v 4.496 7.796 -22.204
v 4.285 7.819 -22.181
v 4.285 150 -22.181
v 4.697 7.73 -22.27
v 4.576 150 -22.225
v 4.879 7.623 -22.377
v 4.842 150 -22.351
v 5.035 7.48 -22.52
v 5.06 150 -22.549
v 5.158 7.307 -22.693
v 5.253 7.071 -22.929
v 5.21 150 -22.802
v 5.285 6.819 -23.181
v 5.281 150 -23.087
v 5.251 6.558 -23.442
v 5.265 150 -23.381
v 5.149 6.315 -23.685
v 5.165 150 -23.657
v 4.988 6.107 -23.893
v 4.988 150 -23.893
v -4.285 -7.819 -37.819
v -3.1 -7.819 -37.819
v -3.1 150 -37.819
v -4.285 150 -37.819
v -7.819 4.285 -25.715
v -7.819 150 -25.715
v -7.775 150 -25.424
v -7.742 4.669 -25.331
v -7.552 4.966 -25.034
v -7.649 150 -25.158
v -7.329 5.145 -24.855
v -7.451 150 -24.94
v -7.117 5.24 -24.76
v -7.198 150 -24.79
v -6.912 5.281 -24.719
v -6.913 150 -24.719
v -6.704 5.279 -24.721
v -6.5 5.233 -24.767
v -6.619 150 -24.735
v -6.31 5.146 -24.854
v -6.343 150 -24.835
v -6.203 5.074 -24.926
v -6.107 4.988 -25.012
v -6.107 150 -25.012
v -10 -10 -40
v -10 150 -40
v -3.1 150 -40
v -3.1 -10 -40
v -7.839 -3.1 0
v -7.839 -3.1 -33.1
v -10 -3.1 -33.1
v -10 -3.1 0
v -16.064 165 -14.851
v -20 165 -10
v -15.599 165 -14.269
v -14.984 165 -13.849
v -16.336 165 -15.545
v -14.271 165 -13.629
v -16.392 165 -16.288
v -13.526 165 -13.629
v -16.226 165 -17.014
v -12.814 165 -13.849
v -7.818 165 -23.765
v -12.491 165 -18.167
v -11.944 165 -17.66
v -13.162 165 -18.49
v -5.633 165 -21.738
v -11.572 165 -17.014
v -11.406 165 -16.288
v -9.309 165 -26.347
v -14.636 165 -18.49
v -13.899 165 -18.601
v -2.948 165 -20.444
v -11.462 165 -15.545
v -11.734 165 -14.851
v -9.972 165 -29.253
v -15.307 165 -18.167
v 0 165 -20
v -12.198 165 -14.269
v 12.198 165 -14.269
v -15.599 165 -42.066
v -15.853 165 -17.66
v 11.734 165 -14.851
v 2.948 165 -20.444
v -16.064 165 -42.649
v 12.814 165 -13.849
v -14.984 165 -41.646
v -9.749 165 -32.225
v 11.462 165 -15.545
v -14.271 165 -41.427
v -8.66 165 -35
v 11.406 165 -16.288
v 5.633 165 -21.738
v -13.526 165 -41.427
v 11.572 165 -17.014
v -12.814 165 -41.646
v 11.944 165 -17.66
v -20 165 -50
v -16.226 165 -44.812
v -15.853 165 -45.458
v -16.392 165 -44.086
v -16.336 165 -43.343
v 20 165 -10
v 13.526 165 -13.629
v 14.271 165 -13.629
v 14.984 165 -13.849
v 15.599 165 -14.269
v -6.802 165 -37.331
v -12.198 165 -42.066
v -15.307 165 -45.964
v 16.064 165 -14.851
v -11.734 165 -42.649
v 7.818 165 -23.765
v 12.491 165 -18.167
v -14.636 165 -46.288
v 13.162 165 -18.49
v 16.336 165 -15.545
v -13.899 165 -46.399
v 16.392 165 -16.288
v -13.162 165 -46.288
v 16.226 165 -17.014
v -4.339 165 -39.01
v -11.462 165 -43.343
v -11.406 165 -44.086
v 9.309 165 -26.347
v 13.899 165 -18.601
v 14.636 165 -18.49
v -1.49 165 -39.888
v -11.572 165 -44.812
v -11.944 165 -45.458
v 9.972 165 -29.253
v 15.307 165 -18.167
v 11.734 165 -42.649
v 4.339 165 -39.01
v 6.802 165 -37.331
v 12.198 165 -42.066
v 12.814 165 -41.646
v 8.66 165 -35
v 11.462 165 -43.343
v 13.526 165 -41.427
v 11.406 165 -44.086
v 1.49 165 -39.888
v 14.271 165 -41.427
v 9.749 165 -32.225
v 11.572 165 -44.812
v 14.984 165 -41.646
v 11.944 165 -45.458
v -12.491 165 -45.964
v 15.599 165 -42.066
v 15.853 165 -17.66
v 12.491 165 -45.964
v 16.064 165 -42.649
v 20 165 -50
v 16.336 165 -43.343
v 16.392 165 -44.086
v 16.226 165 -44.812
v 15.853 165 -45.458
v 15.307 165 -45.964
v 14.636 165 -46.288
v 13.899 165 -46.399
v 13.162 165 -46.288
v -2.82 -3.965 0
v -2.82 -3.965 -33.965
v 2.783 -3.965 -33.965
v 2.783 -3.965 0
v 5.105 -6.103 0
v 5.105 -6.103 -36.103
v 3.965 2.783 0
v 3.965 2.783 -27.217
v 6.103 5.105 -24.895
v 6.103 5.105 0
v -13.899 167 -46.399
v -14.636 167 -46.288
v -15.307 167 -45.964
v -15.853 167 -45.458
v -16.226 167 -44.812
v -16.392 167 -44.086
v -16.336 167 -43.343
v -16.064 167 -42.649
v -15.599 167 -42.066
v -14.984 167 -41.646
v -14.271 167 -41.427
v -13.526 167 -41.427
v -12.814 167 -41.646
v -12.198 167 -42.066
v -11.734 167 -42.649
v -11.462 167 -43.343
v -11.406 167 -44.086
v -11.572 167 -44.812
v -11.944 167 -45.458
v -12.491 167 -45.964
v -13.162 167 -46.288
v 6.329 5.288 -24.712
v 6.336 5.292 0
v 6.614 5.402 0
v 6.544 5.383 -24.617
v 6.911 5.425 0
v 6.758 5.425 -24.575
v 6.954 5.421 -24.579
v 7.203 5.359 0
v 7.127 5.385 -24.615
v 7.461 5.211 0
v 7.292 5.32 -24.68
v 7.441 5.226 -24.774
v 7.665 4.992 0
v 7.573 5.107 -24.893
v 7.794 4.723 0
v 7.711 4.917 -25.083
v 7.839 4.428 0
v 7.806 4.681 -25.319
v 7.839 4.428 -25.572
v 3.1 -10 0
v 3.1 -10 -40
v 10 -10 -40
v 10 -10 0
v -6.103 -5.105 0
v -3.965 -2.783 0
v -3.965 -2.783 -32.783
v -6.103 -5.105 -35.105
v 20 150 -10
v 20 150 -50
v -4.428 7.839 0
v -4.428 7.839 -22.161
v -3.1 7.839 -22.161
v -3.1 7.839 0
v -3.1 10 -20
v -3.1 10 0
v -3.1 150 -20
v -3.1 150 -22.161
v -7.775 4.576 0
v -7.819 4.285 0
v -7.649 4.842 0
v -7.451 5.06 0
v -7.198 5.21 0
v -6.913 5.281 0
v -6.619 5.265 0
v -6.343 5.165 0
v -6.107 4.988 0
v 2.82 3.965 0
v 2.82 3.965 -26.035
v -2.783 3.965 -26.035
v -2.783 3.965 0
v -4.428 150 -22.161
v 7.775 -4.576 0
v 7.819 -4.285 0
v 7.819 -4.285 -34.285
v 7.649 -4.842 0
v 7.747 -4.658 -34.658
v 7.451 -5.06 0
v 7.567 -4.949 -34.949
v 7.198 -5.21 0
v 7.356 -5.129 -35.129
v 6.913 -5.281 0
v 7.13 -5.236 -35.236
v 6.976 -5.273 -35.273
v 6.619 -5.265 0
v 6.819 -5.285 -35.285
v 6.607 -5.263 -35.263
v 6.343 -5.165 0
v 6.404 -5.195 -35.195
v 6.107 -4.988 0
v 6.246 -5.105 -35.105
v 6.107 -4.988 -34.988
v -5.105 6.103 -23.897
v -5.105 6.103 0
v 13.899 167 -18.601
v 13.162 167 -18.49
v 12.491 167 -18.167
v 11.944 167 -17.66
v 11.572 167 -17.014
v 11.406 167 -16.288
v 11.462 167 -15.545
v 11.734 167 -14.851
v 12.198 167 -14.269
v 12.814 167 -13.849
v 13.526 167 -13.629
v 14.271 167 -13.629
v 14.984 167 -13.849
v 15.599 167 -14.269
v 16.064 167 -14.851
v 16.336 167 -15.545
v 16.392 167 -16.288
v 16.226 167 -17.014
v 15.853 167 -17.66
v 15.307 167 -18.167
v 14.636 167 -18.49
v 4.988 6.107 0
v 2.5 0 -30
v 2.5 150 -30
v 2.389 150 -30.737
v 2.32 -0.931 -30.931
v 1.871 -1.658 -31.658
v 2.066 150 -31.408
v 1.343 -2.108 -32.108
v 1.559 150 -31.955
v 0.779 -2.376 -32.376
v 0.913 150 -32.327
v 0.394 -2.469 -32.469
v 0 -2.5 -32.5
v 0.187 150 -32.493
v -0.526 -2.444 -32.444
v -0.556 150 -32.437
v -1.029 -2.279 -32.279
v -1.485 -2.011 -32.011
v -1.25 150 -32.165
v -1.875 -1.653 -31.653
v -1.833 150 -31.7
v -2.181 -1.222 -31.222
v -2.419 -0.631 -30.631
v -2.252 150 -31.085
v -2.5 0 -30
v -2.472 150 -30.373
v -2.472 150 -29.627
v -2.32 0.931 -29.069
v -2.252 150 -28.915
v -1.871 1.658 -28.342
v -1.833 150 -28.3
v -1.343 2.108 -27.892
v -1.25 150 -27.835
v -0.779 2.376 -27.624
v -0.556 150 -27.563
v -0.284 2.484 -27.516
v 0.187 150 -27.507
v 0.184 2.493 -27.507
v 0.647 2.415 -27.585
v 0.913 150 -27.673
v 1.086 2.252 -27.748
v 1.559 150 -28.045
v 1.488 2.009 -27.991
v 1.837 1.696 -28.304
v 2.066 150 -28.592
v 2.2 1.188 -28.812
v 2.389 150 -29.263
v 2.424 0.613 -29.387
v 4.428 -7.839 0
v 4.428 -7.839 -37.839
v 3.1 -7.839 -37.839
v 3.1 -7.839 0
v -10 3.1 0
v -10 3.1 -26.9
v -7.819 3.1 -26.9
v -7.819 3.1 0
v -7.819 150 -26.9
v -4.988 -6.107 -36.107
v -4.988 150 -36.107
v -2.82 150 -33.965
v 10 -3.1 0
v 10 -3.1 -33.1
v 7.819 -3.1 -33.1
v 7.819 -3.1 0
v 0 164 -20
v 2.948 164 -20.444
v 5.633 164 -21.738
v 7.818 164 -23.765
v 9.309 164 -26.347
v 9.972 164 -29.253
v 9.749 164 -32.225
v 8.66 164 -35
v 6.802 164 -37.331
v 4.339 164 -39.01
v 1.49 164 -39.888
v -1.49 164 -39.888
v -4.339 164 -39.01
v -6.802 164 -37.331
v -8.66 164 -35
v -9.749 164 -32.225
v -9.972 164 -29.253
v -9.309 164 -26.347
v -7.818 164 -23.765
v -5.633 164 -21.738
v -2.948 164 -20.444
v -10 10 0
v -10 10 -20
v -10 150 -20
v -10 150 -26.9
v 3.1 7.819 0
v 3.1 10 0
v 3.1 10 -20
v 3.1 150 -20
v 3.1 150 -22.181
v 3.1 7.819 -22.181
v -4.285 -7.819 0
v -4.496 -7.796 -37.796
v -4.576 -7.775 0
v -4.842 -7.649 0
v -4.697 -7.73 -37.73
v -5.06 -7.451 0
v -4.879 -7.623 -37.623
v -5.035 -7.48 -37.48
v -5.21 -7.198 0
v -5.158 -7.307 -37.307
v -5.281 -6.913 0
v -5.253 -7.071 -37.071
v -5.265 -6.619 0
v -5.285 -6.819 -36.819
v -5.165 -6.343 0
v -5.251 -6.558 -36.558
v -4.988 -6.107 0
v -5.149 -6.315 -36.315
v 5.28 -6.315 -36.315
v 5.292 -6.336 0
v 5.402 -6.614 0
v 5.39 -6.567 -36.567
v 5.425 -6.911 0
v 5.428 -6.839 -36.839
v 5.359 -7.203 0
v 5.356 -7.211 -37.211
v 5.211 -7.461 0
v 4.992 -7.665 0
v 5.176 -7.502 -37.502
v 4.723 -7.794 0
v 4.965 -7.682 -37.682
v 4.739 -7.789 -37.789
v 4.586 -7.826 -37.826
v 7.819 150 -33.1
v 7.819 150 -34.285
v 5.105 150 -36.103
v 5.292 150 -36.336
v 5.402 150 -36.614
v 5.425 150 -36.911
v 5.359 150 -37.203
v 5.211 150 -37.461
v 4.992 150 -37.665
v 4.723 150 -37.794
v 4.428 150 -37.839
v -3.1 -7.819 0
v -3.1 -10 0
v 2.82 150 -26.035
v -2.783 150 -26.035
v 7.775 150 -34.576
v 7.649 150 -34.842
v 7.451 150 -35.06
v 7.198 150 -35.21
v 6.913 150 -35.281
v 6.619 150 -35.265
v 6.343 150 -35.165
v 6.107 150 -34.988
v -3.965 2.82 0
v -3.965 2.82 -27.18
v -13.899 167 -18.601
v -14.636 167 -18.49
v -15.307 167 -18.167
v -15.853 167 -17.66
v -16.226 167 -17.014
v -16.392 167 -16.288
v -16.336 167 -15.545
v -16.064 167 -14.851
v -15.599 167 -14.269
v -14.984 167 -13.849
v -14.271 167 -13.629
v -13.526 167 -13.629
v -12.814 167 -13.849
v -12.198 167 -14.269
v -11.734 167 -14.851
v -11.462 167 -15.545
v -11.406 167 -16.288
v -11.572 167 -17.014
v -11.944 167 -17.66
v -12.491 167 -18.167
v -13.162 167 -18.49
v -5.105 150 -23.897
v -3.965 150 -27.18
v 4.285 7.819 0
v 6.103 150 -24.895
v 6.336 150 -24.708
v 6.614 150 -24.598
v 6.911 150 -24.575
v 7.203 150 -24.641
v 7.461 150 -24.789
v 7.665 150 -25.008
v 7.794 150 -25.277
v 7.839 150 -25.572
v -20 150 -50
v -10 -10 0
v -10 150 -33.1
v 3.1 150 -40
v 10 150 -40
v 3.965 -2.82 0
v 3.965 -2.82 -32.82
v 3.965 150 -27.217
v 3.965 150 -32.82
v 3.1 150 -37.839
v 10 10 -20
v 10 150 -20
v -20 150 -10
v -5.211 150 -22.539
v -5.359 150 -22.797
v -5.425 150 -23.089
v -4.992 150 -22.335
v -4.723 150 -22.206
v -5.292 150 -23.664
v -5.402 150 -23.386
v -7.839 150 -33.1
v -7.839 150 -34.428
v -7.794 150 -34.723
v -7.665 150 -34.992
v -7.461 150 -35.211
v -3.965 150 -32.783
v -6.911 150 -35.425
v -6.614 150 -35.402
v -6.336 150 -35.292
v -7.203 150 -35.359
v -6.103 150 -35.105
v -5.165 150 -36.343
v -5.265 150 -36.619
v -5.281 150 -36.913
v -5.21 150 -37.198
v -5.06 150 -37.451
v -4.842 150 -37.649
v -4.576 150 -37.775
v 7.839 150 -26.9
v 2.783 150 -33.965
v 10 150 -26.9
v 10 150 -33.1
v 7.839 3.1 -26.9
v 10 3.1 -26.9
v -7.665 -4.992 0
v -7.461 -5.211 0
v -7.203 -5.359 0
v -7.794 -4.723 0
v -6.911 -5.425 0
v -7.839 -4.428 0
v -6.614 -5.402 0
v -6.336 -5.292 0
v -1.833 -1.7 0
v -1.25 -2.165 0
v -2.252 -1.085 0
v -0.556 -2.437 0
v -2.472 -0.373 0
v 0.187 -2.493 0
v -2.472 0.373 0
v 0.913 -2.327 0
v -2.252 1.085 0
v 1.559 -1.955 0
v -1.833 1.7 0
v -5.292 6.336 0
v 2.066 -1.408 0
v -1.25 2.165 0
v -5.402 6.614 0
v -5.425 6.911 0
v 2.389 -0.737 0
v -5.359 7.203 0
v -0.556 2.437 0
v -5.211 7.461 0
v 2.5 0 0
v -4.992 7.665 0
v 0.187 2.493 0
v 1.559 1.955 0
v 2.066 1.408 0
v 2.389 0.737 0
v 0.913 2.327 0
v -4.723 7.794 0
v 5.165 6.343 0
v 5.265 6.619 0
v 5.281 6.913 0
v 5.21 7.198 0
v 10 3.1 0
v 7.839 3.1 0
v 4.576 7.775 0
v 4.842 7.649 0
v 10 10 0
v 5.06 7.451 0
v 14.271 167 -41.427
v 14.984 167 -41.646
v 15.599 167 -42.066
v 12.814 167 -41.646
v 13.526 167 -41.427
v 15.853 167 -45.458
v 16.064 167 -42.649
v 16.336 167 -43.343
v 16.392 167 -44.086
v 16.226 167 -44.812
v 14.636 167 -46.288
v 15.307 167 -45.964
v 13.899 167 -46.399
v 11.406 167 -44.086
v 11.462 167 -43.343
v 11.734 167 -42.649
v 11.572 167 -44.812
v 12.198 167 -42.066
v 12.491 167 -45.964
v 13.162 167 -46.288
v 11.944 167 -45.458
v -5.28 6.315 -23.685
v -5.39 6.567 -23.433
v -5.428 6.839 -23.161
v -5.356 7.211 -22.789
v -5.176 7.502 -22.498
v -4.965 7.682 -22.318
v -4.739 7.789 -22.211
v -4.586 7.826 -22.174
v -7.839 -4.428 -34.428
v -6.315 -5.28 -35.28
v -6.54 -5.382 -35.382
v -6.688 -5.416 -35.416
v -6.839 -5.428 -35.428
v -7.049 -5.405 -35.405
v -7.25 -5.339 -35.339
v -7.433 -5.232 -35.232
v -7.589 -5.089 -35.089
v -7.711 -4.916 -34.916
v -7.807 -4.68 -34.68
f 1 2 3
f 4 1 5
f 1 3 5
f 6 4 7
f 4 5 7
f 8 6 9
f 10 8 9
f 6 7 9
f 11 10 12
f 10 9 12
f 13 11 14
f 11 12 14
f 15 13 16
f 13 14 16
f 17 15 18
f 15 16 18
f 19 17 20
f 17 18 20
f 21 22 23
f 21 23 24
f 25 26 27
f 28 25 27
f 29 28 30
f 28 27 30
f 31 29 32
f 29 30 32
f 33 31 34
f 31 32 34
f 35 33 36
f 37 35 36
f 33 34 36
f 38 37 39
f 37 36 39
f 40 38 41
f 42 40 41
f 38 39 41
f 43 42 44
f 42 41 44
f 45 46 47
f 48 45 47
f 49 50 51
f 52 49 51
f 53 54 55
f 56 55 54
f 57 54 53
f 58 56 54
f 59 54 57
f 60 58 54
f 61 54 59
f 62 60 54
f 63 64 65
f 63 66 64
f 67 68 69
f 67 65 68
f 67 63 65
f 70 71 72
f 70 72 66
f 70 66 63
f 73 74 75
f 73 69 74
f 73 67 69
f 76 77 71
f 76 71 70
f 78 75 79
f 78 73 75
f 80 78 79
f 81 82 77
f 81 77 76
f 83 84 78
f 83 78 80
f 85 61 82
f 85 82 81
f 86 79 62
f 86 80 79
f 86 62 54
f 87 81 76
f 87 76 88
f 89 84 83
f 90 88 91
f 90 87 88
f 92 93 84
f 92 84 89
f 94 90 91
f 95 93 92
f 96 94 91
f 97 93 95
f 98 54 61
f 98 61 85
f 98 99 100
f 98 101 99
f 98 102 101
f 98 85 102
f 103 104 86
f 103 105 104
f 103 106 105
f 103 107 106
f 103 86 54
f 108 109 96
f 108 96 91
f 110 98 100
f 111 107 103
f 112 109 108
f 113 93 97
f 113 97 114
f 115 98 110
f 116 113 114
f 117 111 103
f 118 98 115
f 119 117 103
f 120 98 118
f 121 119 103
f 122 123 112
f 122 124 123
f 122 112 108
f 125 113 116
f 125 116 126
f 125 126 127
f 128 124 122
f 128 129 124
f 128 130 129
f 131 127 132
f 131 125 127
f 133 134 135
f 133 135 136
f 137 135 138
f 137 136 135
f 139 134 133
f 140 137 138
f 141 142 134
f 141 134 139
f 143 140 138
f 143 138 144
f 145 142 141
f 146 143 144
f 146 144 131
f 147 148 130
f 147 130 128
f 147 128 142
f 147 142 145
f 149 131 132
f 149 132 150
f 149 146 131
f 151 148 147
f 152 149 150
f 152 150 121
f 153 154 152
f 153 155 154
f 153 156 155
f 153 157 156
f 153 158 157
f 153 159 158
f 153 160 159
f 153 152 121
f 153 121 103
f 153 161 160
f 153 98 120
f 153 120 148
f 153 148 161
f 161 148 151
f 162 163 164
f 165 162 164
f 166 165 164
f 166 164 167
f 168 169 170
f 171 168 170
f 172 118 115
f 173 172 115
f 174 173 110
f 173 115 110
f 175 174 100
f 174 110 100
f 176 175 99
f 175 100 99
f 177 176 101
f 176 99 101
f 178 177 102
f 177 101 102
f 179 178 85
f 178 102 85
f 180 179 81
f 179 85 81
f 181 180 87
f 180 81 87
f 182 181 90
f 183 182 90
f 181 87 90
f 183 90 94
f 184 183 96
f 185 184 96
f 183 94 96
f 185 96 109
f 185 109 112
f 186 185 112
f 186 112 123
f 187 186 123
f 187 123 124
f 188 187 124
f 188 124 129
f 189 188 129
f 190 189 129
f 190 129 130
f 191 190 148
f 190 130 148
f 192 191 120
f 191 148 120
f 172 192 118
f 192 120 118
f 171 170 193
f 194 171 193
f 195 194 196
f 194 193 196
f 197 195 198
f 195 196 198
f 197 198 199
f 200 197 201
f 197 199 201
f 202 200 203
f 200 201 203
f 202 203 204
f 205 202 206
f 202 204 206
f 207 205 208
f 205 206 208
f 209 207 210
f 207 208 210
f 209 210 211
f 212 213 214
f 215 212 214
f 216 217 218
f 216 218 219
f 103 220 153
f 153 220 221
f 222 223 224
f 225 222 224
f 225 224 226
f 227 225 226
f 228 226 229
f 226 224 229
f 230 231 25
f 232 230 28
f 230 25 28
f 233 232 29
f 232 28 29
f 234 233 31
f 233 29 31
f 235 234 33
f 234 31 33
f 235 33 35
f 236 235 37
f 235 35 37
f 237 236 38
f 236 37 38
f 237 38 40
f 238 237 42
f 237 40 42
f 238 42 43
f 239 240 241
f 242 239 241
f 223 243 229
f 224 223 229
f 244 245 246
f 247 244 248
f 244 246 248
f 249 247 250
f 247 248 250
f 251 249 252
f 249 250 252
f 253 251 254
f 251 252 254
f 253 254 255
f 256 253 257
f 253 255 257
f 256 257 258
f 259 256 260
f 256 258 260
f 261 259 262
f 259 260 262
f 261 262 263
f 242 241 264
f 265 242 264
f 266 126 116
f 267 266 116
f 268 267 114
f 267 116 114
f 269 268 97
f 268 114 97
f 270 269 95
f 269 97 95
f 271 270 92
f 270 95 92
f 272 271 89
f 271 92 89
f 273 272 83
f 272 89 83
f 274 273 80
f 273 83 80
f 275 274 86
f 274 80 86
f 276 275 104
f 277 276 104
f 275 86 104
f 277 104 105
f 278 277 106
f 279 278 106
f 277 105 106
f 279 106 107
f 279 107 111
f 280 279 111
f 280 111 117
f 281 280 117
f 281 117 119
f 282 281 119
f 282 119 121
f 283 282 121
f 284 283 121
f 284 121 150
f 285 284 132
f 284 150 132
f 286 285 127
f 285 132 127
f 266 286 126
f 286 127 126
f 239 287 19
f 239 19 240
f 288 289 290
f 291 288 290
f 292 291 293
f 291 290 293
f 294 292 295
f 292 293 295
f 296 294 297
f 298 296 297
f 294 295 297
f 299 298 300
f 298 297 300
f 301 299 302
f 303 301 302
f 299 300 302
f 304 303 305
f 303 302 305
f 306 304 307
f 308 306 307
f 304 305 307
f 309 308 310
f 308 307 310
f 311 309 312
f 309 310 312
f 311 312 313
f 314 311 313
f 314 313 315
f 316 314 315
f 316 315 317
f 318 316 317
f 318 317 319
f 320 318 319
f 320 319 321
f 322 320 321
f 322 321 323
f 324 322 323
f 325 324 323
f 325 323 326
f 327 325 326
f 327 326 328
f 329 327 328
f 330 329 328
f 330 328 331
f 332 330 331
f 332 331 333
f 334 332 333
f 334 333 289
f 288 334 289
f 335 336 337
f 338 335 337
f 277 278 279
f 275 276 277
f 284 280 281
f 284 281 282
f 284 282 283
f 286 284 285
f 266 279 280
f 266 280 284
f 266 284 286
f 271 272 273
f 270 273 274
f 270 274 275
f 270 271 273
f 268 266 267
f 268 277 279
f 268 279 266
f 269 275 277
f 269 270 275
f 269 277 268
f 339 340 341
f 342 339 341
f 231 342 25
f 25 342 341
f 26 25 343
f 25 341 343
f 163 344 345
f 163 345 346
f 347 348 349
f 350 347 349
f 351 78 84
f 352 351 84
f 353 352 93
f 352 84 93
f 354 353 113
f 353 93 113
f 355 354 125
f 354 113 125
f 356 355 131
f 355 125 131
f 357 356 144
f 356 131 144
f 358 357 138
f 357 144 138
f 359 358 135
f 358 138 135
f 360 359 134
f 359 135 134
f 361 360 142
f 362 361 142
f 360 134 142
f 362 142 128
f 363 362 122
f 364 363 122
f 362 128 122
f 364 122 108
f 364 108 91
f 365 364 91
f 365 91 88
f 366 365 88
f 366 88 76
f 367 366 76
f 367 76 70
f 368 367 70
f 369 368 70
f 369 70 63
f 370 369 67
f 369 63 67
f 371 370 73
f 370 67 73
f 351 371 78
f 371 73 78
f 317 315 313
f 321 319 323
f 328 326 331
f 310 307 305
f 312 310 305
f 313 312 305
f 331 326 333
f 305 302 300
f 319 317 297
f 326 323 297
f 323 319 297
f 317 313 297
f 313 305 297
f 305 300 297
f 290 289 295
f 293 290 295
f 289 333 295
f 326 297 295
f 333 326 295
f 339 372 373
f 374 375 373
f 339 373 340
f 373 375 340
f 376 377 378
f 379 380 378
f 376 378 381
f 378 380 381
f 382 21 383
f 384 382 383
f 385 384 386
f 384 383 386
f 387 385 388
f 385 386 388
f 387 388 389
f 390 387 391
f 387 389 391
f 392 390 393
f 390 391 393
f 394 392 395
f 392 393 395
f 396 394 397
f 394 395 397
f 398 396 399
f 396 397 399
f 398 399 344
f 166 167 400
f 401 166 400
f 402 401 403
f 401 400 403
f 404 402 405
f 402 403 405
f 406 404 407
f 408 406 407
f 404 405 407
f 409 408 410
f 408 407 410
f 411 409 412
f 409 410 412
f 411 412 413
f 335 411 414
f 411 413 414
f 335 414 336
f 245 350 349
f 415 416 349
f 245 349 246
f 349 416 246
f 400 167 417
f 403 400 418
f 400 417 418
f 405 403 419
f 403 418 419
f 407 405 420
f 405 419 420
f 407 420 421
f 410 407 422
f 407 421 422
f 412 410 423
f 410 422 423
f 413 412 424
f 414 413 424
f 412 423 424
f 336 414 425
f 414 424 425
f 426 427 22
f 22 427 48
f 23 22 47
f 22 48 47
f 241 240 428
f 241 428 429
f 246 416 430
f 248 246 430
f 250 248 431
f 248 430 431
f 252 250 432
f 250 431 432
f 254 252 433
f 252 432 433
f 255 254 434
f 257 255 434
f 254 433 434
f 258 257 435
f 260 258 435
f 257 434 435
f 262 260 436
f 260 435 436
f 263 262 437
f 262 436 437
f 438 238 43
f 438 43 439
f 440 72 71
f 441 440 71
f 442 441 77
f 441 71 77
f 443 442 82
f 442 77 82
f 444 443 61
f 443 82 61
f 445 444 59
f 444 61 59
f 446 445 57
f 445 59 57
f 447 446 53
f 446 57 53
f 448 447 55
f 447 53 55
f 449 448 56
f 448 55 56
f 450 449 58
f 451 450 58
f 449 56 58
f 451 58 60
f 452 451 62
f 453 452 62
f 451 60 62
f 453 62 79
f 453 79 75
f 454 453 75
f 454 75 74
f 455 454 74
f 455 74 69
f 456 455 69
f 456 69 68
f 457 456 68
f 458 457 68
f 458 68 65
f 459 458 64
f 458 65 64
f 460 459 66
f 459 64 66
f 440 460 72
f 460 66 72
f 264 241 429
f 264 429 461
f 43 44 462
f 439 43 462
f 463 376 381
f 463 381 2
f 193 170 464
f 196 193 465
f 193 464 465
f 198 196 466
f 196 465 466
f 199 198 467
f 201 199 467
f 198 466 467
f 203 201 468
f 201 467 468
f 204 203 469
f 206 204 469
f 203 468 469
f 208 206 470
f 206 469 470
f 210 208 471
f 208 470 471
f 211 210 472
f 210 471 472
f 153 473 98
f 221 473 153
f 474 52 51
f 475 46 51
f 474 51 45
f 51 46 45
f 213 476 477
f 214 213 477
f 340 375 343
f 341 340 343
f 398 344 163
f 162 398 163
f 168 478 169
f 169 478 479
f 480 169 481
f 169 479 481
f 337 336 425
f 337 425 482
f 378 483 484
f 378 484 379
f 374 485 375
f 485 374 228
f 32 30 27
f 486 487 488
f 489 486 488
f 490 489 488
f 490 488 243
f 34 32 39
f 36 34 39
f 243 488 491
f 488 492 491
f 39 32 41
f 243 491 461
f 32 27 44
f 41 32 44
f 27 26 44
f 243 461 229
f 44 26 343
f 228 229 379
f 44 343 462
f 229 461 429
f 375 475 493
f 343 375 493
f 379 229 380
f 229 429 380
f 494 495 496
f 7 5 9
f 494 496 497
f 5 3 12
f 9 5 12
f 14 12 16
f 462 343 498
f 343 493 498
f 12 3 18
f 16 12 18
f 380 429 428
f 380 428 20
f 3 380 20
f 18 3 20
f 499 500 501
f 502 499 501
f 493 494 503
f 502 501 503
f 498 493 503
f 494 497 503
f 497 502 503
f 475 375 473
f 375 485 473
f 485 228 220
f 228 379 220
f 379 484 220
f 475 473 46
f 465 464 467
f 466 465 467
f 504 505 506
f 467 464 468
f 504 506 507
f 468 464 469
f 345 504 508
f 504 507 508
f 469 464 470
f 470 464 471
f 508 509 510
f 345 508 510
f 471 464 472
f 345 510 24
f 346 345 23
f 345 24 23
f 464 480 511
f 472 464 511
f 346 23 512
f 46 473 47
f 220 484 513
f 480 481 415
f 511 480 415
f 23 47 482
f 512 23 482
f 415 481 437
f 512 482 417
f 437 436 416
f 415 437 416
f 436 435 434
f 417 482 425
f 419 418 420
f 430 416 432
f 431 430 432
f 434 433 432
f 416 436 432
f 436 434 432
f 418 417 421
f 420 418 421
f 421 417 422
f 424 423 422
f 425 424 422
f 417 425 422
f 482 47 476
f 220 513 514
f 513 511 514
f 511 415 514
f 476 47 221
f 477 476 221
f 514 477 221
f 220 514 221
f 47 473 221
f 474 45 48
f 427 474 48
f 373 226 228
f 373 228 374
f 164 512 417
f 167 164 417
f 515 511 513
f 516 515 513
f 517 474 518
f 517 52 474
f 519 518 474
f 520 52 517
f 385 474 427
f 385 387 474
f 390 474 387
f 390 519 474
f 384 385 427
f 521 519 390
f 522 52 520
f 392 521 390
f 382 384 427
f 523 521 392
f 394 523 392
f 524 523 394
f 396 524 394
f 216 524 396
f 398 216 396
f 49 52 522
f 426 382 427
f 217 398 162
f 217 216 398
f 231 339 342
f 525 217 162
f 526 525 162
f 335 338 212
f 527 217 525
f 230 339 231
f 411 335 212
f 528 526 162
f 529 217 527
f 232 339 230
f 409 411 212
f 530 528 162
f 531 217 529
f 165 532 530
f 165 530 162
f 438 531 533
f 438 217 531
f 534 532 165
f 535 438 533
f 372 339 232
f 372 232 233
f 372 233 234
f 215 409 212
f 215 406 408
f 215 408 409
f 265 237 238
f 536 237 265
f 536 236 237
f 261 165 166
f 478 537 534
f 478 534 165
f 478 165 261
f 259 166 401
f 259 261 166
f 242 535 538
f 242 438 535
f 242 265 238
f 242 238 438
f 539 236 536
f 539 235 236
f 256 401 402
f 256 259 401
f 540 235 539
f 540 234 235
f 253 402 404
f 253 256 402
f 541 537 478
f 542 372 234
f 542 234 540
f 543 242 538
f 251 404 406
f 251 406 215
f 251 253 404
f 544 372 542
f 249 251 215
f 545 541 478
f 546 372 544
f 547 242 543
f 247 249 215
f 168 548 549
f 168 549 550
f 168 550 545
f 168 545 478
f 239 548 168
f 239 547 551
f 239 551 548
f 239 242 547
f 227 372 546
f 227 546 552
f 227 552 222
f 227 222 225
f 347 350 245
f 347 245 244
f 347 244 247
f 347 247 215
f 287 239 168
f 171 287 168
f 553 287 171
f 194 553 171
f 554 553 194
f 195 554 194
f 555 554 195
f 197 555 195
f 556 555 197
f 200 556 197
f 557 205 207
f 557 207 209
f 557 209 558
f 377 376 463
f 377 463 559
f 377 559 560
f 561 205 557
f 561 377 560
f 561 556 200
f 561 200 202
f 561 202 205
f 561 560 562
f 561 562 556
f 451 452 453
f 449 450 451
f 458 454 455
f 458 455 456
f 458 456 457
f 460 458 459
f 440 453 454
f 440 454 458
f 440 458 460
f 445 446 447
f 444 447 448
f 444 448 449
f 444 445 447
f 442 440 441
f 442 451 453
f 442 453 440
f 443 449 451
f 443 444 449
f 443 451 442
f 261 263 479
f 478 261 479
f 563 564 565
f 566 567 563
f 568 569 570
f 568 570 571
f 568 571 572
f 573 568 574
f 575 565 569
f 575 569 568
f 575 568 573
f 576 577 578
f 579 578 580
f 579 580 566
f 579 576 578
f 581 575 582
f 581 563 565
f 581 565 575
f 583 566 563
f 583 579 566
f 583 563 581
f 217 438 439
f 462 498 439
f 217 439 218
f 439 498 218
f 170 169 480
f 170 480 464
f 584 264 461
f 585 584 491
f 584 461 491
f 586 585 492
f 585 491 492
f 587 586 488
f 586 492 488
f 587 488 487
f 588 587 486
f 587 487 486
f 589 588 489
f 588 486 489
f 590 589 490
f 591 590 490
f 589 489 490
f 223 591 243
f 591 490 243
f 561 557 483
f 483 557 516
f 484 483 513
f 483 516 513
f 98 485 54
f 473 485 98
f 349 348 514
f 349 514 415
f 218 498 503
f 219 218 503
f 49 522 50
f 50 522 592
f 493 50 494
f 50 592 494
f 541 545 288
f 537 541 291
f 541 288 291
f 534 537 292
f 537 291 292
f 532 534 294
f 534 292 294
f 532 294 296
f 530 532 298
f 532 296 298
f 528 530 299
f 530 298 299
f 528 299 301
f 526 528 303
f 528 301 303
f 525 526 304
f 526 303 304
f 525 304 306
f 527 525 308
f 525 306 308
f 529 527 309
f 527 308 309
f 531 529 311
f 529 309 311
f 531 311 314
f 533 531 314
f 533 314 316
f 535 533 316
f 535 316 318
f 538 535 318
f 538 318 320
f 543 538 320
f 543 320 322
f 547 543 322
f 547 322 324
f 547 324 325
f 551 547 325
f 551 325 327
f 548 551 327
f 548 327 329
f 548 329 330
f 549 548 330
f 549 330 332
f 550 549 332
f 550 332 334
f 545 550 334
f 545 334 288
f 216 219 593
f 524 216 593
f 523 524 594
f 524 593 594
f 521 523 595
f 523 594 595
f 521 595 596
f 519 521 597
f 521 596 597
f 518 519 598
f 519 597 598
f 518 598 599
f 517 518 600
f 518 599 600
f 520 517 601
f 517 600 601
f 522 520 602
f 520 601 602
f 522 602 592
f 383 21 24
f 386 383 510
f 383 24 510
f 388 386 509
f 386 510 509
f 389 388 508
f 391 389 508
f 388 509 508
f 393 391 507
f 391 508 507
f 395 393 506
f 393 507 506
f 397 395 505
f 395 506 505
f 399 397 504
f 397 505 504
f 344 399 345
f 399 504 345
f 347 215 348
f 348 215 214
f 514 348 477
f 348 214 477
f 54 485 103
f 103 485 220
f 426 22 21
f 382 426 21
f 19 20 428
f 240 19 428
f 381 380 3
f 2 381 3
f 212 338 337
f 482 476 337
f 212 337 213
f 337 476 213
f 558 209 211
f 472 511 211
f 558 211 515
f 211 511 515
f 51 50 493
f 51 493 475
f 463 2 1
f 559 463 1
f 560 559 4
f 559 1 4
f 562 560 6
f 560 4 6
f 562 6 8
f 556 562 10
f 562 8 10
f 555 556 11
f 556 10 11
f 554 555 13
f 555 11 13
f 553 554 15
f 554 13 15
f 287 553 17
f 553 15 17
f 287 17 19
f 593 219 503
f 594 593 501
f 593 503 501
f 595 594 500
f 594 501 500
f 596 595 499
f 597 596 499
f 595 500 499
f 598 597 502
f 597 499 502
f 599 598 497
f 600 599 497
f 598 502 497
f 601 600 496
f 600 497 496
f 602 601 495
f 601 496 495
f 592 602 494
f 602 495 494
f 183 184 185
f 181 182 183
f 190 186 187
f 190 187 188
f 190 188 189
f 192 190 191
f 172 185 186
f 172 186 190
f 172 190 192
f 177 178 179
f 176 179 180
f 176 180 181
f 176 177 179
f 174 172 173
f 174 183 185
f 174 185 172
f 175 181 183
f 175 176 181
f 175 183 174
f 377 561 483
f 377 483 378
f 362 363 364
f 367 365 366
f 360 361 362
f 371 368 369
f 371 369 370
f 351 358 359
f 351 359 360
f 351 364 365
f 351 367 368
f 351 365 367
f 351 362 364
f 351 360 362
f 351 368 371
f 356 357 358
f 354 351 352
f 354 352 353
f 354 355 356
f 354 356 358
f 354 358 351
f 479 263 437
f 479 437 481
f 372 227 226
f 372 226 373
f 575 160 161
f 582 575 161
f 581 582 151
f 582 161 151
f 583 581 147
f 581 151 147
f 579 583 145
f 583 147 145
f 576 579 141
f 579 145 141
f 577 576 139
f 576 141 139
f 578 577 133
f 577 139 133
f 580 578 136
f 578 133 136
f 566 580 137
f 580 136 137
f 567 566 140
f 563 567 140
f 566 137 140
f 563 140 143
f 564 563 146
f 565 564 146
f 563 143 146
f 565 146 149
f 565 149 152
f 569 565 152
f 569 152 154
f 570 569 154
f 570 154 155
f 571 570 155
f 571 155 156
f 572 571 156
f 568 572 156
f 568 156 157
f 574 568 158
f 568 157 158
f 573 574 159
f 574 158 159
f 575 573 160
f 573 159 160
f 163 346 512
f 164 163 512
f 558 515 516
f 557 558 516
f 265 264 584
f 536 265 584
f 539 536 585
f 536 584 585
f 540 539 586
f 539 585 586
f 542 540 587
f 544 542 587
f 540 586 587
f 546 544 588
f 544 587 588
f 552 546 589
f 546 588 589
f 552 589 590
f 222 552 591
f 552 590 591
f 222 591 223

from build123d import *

# Parameters (mm, degrees)
SKETCH2_R           = 2.5
SKETCH4_W           = 40
SKETCH4_H           = 40
BOSS_EXTRUDE1_DEPTH = 15
SKETCH5_R           = 10
CUT_EXTRUDE1_DEPTH  = 1
SKETCH6_R           = 2.5
BOSS_EXTRUDE2_DEPTH = 2


with BuildPart() as part:
    # Sweep1: sweep along a path in Sketch3
    with BuildLine(Plane(origin=(0, 0, 0), x_dir=(0, 0, -1), z_dir=(1, 0, 0))) as sweep1_path:
        Line((0, 0), (30, 0))
        Line((30, 0), (30, 150))
    # Sketch2 → Sweep1 (sweep)
    with BuildSketch(Plane.XY):
        with BuildLine():
            Line((-10, -10), (-3.1, -10))
            Line((-3.1, -10), (-3.1, -7.81857447))
            Line((-3.1, -7.81857447), (-4.285374034, -7.81857447))
            ThreePointArc((-4.285374034, -7.81857447), (-5.210402021, -7.198473435), (-4.988208383, -6.107220917))
            Line((-4.988208383, -6.107220917), (-2.819718275, -3.96470075))
            Line((-2.819718275, -3.96470075), (0, -3.96470075))
            Line((0, -3.96470075), (2.782738033, -3.96470075))
            Line((2.782738033, -3.96470075), (5.105242131, -6.103332486))
            ThreePointArc((5.105242131, -6.103332486), (5.359419929, -7.202533996), (4.427854938, -7.838959152))
            Line((4.427854938, -7.838959152), (3.1, -7.838959152))
            Line((3.1, -7.838959152), (3.1, -10))
            Line((3.1, -10), (10, -10))
            Line((10, -10), (10, -3.1))
            Line((10, -3.1), (7.81857447, -3.1))
            Line((7.81857447, -3.1), (7.81857447, -4.285374034))
            ThreePointArc((7.81857447, -4.285374034), (7.198473435, -5.210402021), (6.107220917, -4.988208383))
            Line((6.107220917, -4.988208383), (3.96470075, -2.819718275))
            Line((3.96470075, -2.819718275), (3.96470075, 0))
            Line((3.96470075, 0), (3.96470075, 2.782738033))
            Line((3.96470075, 2.782738033), (6.103332486, 5.105242131))
            ThreePointArc((6.103332486, 5.105242131), (7.202533996, 5.359419929), (7.838959152, 4.427854938))
            Line((7.838959152, 4.427854938), (7.838959152, 3.1))
            Line((7.838959152, 3.1), (10, 3.1))
            Line((10, 3.1), (10, 10))
            Line((10, 10), (3.1, 10))
            Line((3.1, 10), (3.1, 7.81857447))
            Line((3.1, 7.81857447), (4.285374034, 7.81857447))
            ThreePointArc((4.285374034, 7.81857447), (5.210402021, 7.198473435), (4.988208383, 6.107220917))
            Line((4.988208383, 6.107220917), (2.819718275, 3.96470075))
            Line((2.819718275, 3.96470075), (0, 3.96470075))
            Line((0, 3.96470075), (-2.782738033, 3.96470075))
            Line((-2.782738033, 3.96470075), (-5.105242131, 6.103332486))
            ThreePointArc((-5.105242131, 6.103332486), (-5.359419929, 7.202533996), (-4.427854938, 7.838959152))
            Line((-4.427854938, 7.838959152), (-3.1, 7.838959152))
            Line((-3.1, 7.838959152), (-3.1, 10))
            Line((-3.1, 10), (-10, 10))
            Line((-10, 10), (-10, 3.1))
            Line((-10, 3.1), (-7.81857447, 3.1))
            Line((-7.81857447, 3.1), (-7.81857447, 4.285374034))
            ThreePointArc((-7.81857447, 4.285374034), (-7.198473435, 5.210402021), (-6.107220917, 4.988208383))
            Line((-6.107220917, 4.988208383), (-3.96470075, 2.819718275))
            Line((-3.96470075, 2.819718275), (-3.96470075, 0))
            Line((-3.96470075, 0), (-3.96470075, -2.782738033))
            Line((-3.96470075, -2.782738033), (-6.103332486, -5.105242131))
            ThreePointArc((-6.103332486, -5.105242131), (-7.202533996, -5.359419929), (-7.838959152, -4.427854938))
            Line((-7.838959152, -4.427854938), (-7.838959152, -3.1))
            Line((-7.838959152, -3.1), (-10, -3.1))
            Line((-10, -3.1), (-10, -10))
        make_face()
        Circle(SKETCH2_R, mode=Mode.SUBTRACT)
    sweep(path=sweep1_path.line, transition=Transition.RIGHT)

    # Sketch4 → Boss-Extrude1 (add)
    with BuildSketch(Plane(origin=(0, 150, 0), x_dir=(1, 0, 0), z_dir=(0, 1, 0))):
        with Locations((0, 30)):
            Rectangle(SKETCH4_W, SKETCH4_H)
    extrude(amount=BOSS_EXTRUDE1_DEPTH)

    # Sketch5 → Cut-Extrude1 (cut)
    with BuildSketch(Plane(origin=(0, 165, 0), x_dir=(1, 0, 0), z_dir=(0, 1, 0))):
        with Locations(Location((0, 30, 0), (0, 0, 270))):
            Circle(SKETCH5_R)
    extrude(amount=-CUT_EXTRUDE1_DEPTH, mode=Mode.SUBTRACT)

    # Sketch6 → Boss-Extrude2 (add)
    with BuildSketch(Plane(origin=(0, 165, 0), x_dir=(1, 0, 0), z_dir=(0, 1, 0))):
        with Locations(Location((-13.898862729, 43.898862729, 0), (0, 0, 90))):
            Circle(SKETCH6_R)
        with Locations(Location((13.898862729, 43.898862729, 0), (0, 0, 90))):
            Circle(SKETCH6_R)
        with Locations(Location((13.898862729, 16.101137271, 0), (0, 0, 90))):
            Circle(SKETCH6_R)
        with Locations(Location((-13.898862729, 16.101137271, 0), (0, 0, 90))):
            Circle(SKETCH6_R)
    extrude(amount=BOSS_EXTRUDE2_DEPTH)


solid = part.part
